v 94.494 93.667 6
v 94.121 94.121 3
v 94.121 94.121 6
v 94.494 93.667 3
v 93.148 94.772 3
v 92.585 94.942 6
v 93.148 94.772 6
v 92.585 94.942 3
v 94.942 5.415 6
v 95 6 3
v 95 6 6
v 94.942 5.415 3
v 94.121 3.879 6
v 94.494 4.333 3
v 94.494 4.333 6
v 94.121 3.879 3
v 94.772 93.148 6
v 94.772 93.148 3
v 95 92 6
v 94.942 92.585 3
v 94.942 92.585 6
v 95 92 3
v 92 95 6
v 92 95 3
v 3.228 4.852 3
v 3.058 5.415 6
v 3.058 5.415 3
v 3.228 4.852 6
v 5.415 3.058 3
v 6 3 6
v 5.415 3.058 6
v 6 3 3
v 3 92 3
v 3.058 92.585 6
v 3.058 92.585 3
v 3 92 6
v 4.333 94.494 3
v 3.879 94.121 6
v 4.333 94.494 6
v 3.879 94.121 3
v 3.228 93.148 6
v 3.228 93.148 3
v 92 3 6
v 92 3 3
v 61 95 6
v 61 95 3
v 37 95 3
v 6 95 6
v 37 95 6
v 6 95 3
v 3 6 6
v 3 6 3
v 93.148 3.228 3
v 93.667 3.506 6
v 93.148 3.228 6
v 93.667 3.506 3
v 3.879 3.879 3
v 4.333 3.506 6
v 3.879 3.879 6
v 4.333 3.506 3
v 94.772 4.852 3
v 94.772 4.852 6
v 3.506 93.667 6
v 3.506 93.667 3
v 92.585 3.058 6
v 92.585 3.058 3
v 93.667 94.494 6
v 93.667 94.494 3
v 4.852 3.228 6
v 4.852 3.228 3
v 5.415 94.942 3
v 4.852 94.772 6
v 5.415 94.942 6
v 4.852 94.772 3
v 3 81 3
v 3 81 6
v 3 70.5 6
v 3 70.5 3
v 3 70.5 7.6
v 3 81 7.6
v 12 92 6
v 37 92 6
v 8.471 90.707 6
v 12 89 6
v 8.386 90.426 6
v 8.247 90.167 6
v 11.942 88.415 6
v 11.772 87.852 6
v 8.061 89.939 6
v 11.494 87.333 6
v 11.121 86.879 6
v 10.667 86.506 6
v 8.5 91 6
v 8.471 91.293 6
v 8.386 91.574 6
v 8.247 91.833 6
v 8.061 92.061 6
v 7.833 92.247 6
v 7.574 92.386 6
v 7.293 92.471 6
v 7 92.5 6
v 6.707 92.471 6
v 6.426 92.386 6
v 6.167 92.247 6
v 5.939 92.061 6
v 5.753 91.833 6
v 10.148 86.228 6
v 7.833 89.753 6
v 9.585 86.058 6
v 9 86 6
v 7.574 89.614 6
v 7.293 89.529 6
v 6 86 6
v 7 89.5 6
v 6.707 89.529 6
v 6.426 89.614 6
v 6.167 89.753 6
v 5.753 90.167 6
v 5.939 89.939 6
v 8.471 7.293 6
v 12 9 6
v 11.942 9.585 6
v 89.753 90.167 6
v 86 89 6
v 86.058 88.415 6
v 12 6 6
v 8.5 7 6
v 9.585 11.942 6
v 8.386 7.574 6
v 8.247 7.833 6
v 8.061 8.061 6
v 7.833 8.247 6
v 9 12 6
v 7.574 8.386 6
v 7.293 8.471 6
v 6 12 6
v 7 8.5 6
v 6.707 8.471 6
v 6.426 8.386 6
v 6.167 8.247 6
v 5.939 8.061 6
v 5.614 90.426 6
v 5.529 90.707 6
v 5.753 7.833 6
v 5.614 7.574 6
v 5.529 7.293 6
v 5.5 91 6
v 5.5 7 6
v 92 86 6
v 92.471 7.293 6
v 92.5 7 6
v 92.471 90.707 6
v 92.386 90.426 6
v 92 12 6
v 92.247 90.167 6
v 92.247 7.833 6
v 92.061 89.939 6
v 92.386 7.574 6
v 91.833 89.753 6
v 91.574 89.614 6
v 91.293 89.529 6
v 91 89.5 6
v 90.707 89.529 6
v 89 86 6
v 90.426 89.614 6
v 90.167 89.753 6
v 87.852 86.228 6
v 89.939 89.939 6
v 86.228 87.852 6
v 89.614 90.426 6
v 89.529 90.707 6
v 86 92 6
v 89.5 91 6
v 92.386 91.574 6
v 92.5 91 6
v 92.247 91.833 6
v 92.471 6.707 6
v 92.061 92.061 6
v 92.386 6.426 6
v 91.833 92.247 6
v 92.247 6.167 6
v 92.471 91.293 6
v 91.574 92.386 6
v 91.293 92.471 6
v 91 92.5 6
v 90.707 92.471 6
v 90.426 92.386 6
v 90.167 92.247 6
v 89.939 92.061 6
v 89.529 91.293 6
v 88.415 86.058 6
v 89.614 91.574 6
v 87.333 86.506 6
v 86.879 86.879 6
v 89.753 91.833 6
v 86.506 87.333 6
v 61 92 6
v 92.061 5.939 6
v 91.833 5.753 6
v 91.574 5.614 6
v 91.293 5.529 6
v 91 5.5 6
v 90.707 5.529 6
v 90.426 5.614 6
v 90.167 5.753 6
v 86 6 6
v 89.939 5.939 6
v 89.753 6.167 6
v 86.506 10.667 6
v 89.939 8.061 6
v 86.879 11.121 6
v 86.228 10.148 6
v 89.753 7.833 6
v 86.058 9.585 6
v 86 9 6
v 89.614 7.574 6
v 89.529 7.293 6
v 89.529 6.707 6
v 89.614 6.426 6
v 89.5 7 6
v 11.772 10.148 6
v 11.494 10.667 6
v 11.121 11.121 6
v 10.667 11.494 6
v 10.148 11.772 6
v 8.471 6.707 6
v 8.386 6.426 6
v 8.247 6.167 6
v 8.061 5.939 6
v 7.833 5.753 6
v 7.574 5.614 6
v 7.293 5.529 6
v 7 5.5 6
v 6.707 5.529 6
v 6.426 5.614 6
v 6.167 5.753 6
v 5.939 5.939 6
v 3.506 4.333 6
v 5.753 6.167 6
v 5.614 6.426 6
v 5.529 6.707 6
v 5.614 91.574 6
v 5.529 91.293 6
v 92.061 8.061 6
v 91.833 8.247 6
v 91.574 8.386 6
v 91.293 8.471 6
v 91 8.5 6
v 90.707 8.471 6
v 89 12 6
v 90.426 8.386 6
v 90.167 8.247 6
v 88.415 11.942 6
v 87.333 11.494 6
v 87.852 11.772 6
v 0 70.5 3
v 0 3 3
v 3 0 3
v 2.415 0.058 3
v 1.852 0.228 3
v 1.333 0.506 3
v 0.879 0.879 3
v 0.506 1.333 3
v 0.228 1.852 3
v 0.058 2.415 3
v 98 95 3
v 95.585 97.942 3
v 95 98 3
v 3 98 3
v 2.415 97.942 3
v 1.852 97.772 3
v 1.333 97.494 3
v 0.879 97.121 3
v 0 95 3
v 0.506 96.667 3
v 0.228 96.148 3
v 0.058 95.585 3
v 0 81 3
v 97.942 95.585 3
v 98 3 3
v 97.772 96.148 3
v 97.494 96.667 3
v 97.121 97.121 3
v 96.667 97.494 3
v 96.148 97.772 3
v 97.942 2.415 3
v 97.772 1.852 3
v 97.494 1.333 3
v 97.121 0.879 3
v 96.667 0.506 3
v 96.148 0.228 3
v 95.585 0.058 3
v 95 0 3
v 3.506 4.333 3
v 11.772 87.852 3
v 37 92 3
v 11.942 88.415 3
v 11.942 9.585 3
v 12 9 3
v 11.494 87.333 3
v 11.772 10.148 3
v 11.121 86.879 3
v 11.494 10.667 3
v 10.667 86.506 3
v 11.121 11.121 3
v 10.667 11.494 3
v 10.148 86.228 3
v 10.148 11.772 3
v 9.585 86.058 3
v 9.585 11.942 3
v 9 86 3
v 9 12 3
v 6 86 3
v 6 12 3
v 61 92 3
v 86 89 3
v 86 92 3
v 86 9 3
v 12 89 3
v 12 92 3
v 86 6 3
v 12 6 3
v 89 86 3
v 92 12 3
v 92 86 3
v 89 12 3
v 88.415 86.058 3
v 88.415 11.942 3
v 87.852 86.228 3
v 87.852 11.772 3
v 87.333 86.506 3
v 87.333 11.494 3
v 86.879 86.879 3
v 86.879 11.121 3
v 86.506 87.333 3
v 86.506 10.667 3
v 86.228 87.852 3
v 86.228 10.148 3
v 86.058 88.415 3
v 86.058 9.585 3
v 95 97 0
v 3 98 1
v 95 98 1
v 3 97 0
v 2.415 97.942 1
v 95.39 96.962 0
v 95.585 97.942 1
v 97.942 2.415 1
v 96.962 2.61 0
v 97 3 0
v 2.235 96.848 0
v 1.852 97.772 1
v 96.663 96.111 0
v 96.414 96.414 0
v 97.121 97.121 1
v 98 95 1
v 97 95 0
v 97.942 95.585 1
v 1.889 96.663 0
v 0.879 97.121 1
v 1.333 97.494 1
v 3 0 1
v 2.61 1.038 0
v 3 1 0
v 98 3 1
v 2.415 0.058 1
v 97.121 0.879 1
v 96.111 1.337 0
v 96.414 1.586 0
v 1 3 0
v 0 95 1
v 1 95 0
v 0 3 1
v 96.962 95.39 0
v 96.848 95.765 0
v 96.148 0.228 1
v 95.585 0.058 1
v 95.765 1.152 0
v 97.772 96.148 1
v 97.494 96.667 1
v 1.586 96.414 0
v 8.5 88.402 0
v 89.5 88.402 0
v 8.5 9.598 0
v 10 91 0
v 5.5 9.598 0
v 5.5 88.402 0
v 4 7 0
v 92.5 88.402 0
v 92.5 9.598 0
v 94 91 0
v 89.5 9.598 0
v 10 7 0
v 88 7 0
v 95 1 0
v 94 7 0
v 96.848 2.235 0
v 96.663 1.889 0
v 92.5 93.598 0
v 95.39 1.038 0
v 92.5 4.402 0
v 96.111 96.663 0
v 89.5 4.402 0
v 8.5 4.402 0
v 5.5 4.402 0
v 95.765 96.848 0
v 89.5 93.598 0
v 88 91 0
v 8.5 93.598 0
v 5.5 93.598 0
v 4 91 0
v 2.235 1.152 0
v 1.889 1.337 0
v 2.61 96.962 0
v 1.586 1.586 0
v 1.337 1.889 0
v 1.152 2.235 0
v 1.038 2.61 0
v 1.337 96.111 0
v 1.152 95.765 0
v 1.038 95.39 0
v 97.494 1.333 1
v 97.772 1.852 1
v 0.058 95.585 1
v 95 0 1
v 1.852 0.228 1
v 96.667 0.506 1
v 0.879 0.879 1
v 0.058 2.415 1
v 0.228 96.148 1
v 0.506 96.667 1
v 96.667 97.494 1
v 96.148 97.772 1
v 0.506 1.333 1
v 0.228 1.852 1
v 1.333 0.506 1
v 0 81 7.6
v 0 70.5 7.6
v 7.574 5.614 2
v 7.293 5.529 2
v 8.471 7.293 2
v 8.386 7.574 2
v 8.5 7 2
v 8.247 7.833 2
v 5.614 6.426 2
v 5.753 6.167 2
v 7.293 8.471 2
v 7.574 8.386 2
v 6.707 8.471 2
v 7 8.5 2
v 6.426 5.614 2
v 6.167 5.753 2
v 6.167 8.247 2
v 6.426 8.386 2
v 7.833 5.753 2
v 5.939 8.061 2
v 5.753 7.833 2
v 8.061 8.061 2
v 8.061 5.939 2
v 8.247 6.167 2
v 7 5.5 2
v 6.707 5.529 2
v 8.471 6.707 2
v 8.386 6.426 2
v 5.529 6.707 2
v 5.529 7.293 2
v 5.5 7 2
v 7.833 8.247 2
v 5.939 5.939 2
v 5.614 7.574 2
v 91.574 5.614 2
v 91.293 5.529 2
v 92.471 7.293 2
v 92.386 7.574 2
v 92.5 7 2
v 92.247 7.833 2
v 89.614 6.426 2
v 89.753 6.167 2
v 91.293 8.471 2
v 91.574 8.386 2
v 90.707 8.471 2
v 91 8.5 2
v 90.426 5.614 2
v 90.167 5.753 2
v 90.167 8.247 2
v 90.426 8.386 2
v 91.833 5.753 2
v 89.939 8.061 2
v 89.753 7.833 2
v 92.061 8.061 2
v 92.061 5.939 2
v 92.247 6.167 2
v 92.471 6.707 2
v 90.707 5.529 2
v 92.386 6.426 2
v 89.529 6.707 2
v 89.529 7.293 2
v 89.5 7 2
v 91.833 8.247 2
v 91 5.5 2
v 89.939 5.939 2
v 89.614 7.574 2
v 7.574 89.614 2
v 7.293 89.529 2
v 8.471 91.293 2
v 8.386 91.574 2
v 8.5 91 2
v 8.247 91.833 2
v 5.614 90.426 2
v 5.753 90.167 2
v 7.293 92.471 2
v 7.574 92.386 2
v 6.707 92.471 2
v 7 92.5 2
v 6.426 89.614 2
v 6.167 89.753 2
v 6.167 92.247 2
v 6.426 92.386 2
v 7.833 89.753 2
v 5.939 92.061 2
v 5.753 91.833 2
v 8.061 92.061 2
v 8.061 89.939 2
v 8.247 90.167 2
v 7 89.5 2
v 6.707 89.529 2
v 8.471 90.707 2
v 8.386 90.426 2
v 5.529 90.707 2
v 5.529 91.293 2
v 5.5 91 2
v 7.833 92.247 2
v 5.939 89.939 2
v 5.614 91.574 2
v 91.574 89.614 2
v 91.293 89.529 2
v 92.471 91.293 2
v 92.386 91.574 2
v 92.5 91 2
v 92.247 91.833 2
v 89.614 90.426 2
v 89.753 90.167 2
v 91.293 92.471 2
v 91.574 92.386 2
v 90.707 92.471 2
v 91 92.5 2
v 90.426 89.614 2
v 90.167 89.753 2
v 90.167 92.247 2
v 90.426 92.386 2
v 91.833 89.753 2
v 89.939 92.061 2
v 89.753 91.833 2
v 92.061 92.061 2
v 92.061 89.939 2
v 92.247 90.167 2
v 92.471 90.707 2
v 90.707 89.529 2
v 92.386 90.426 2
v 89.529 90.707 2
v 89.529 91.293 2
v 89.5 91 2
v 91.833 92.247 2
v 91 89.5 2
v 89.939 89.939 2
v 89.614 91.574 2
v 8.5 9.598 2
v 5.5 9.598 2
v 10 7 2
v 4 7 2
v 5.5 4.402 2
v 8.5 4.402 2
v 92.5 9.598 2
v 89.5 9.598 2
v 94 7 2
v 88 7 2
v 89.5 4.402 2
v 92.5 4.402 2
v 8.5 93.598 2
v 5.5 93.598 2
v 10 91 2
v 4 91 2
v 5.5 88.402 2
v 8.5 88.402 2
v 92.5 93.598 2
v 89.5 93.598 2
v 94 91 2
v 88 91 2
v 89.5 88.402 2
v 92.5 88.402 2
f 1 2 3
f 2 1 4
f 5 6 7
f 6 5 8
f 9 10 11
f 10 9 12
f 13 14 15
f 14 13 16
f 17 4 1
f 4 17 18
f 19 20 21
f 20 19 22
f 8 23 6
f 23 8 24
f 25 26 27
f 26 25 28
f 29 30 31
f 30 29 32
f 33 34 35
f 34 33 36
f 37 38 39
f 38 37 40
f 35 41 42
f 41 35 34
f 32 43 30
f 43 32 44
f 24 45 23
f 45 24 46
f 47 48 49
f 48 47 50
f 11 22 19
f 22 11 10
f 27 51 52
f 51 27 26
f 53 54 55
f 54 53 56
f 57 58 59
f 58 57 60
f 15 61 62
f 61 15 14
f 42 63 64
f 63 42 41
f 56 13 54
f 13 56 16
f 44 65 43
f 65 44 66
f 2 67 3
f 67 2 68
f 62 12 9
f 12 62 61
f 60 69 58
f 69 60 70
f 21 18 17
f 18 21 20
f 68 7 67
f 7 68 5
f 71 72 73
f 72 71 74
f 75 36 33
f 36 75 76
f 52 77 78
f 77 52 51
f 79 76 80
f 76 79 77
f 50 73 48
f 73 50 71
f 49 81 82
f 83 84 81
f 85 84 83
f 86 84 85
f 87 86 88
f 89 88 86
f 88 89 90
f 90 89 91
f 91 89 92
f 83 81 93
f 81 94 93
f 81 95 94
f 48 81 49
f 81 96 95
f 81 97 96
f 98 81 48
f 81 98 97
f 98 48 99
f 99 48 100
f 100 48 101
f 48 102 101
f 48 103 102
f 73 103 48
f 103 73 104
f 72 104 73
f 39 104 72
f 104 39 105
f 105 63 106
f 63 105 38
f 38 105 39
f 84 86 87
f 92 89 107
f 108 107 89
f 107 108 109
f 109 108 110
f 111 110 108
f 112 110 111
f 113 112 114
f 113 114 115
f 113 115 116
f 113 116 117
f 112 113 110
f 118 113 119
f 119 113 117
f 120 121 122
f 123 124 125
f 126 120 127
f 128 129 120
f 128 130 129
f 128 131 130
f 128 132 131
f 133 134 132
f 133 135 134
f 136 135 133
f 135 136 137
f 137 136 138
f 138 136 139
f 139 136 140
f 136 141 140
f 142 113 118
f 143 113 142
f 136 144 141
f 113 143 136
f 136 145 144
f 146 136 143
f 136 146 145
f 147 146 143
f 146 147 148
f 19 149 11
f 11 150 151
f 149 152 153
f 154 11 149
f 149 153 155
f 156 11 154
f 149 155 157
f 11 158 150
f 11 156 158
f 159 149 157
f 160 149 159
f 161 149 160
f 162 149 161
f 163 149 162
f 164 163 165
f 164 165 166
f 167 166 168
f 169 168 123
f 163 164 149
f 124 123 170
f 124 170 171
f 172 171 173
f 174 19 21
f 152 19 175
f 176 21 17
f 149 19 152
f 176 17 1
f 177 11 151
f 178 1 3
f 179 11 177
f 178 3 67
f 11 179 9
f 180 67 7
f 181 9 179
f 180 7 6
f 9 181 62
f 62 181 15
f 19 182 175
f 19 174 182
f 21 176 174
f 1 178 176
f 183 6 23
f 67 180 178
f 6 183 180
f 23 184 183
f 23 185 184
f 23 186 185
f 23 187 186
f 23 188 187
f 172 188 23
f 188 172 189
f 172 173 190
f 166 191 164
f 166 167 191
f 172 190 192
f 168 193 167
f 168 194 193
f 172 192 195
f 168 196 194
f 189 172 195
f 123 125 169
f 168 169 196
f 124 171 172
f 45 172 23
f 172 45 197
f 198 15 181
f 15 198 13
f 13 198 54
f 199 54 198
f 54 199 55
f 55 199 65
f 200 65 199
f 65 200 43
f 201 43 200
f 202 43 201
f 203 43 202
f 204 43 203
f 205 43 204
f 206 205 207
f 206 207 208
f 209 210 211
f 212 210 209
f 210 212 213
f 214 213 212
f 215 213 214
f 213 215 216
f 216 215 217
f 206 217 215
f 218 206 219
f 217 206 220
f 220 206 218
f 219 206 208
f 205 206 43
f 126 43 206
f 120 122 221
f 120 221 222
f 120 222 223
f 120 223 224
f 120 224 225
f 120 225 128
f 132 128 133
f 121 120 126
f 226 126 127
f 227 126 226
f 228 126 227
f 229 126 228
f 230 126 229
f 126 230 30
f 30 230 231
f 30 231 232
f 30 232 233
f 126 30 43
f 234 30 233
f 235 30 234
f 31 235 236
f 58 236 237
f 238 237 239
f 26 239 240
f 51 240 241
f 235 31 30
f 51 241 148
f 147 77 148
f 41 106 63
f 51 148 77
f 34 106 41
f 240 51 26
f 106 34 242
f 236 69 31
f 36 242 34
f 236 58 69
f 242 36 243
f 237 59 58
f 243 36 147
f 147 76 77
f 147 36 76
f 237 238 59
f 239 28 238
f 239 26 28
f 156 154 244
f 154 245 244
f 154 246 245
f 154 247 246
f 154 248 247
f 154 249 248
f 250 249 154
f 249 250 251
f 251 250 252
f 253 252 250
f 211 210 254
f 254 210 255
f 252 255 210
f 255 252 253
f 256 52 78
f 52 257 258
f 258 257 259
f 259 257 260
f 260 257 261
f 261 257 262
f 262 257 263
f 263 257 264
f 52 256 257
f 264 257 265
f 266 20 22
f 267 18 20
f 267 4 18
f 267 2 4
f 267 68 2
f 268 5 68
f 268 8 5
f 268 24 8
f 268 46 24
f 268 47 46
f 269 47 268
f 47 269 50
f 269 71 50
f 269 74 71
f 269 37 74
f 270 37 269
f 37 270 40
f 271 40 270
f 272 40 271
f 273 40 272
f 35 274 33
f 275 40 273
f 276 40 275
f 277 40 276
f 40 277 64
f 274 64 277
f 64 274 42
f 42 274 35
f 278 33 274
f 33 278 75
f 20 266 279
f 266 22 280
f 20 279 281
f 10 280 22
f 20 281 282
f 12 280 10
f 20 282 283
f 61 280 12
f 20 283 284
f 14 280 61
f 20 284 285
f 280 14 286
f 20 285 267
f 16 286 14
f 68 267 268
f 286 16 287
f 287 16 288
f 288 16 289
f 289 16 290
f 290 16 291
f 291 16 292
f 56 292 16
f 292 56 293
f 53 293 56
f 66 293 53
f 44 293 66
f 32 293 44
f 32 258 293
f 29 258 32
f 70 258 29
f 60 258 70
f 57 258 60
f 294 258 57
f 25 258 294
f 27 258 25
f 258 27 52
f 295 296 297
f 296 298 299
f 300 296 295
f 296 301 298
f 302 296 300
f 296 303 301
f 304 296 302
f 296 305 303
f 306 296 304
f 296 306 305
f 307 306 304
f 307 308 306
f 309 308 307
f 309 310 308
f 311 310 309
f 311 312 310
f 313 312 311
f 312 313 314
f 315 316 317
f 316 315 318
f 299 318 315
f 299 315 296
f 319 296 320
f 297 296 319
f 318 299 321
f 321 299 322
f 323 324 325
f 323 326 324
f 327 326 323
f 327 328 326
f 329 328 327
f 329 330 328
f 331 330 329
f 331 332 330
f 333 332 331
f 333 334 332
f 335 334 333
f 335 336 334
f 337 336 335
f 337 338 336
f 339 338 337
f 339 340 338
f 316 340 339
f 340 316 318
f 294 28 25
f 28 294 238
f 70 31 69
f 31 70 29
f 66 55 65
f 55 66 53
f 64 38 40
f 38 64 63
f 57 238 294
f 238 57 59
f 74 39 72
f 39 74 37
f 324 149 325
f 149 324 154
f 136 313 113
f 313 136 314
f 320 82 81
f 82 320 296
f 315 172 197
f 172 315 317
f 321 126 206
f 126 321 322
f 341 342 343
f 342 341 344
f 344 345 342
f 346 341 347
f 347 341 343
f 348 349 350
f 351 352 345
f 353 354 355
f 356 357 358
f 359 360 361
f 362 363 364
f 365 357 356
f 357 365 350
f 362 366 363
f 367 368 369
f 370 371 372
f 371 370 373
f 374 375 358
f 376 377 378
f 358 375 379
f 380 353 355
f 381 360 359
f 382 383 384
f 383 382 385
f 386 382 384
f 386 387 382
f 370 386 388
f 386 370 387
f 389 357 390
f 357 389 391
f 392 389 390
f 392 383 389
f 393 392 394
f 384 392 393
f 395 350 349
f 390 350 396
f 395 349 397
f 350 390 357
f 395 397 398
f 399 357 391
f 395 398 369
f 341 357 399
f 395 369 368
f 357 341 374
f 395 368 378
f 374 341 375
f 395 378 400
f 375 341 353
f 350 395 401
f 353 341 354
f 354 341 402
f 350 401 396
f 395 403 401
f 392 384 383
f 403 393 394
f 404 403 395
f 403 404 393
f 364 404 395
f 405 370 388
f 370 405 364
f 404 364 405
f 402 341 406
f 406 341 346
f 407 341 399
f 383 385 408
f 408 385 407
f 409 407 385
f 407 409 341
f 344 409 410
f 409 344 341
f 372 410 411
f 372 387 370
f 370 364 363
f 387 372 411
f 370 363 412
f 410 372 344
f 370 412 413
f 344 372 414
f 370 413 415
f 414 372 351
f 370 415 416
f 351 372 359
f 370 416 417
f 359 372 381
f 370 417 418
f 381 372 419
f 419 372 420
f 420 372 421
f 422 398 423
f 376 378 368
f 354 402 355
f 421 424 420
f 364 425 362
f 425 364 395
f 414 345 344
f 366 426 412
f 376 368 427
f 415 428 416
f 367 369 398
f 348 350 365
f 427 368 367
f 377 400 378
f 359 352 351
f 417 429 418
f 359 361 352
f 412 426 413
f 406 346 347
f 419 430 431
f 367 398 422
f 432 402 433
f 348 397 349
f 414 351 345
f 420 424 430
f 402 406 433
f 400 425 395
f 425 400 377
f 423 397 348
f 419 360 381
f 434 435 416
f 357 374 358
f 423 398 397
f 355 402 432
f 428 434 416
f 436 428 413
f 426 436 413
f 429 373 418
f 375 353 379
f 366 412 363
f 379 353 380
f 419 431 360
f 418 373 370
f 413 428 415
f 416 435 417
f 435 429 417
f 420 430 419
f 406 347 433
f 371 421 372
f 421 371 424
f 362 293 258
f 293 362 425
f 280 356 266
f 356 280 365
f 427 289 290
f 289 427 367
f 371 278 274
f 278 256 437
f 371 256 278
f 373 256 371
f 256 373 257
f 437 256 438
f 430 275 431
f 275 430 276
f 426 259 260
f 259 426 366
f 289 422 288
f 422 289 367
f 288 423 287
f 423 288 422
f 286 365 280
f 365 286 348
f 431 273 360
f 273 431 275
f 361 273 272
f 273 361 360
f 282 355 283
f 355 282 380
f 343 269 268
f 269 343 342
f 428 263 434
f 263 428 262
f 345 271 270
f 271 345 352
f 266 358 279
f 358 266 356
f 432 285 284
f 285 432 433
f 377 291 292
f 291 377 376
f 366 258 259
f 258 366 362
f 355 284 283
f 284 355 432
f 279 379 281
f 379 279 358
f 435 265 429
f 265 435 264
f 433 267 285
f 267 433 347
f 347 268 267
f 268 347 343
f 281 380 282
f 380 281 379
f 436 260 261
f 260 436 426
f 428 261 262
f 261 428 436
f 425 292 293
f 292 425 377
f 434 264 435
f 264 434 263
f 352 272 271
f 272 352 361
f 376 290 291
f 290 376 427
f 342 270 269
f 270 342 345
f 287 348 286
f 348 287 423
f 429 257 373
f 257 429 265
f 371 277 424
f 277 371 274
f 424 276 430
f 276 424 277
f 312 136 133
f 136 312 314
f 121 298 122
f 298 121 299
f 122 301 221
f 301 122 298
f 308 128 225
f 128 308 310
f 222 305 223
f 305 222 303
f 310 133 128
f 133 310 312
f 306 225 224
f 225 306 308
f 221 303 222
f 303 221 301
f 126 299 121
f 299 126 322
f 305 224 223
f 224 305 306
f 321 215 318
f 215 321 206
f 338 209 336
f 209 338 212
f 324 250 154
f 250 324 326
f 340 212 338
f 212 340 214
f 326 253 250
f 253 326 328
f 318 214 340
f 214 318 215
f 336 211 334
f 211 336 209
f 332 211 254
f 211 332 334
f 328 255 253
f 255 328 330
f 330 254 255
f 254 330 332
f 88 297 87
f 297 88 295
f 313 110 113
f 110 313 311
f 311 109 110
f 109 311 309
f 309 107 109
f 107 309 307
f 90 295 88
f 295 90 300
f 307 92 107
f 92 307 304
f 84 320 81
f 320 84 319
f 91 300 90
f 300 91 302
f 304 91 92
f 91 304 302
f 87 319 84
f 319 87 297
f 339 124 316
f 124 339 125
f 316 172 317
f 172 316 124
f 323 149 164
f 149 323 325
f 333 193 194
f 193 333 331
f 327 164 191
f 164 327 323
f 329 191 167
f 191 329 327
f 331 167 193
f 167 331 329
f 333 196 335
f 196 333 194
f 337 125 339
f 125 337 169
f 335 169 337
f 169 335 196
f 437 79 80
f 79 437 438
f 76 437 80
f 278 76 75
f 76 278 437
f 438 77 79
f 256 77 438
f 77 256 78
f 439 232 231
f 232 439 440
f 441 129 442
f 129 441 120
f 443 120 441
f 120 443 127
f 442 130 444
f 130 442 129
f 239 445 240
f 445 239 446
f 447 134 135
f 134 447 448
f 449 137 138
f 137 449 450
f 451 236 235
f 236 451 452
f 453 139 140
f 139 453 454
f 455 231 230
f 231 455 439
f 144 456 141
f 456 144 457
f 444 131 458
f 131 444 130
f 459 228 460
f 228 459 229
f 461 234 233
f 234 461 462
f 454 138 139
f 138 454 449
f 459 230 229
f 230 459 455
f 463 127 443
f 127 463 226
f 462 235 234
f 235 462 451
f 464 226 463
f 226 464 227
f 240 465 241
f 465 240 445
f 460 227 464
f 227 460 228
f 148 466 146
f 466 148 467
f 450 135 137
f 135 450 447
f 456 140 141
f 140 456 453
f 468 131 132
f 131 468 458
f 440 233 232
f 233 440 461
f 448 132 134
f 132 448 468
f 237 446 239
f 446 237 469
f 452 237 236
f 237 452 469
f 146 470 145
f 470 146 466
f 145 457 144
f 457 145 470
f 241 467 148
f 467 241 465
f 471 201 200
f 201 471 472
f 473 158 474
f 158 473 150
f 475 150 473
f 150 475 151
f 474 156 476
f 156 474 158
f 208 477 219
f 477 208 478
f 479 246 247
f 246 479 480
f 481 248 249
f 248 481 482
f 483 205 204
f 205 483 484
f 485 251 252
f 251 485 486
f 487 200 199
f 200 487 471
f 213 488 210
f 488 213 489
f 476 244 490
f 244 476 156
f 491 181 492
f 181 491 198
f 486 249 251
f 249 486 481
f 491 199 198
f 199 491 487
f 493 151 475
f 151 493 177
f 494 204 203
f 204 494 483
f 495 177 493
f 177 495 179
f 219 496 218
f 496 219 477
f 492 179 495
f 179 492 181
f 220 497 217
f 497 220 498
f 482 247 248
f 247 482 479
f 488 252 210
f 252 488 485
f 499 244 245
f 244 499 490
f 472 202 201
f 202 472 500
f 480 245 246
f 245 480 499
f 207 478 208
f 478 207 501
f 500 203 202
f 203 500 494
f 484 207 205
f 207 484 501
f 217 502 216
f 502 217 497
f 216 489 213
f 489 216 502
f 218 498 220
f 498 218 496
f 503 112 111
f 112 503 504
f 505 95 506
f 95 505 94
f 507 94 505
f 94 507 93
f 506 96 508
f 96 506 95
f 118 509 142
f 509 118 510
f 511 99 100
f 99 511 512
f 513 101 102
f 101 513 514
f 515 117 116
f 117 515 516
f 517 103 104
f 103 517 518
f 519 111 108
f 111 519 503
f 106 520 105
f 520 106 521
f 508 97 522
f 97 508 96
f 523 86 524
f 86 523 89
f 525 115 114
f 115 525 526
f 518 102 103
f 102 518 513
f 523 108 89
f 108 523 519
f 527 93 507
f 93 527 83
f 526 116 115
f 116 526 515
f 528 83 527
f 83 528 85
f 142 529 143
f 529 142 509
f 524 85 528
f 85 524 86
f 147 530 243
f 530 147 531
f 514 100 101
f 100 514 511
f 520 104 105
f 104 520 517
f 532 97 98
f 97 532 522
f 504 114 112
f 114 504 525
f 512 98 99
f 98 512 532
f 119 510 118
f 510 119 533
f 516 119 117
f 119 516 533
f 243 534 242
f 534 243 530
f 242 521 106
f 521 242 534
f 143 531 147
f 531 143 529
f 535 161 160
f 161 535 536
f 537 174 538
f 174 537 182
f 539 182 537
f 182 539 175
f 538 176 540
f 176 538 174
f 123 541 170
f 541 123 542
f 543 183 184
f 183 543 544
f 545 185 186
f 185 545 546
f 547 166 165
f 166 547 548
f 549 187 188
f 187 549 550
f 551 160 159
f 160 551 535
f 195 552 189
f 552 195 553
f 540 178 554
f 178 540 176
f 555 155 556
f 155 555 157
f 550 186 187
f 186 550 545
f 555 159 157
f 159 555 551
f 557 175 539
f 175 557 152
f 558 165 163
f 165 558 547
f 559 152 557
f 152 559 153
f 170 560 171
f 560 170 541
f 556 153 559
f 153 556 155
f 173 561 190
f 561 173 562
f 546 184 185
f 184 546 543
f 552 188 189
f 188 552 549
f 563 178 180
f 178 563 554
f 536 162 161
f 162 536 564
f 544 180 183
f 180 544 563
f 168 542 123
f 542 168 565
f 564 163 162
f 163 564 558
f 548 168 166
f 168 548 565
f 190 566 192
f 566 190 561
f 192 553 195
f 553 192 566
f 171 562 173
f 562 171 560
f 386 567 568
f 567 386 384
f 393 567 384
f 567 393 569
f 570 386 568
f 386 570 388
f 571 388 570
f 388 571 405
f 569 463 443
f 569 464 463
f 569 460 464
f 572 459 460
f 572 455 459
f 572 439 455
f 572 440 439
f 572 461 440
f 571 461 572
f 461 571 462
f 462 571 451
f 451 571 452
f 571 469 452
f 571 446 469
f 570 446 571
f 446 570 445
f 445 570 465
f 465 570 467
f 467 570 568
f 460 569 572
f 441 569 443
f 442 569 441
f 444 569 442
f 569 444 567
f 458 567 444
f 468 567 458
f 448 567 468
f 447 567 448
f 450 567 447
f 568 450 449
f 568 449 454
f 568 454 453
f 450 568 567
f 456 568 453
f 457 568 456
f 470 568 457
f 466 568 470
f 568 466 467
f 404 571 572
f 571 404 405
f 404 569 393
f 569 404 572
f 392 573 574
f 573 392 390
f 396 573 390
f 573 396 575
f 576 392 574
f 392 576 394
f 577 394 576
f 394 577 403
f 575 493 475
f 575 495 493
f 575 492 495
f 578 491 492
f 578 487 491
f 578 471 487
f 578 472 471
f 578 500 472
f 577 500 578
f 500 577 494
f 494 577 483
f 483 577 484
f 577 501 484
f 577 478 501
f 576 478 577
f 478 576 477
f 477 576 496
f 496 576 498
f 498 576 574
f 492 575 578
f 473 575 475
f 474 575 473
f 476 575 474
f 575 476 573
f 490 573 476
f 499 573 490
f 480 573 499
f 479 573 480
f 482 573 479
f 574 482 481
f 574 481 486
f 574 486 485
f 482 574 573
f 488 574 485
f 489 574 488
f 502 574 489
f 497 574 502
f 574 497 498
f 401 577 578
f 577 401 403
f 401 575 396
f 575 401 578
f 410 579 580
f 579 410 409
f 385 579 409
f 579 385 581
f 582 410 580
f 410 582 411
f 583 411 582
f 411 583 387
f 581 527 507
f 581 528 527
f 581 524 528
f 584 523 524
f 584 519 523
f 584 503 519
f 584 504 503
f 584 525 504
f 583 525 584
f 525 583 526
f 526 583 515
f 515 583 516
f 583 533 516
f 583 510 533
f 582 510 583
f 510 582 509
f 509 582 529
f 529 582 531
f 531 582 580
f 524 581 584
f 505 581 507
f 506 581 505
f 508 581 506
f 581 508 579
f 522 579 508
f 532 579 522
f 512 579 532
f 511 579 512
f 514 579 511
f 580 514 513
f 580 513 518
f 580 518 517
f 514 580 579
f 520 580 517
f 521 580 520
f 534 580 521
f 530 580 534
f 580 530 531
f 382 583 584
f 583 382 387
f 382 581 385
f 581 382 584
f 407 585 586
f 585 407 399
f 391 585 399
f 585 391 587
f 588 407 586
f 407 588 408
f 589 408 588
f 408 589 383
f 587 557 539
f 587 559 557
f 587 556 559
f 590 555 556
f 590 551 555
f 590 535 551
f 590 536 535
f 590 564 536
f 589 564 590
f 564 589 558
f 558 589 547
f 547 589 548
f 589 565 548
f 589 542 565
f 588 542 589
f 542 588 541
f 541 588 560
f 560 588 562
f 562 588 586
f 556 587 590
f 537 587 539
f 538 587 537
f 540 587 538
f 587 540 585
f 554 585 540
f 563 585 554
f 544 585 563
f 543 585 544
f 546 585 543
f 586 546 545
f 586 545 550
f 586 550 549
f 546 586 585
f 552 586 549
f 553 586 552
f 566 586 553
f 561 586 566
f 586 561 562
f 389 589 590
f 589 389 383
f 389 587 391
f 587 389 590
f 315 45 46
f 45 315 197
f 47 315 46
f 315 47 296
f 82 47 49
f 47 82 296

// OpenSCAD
$fn=32;

// https://www.youtube.com/watch?v=gKOkJWiTgAY
module roundedsquare(xdim, ydim, zdim, rdim){
    hull() {
        translate([       rdim,        rdim, 0]) cylinder(h=zdim, r=rdim);
        translate([xdim - rdim,        rdim, 0]) cylinder(h=zdim, r=rdim);
        translate([       rdim, ydim - rdim, 0]) cylinder(h=zdim, r=rdim);
        translate([xdim - rdim, ydim - rdim, 0]) cylinder(h=zdim, r=rdim);
    }
}
module chamferedsquare(xdim, ydim, zdim, r1dim, r2dim){
    bigrdim = max(r1dim, r2dim);
    hull() {
        translate([       bigrdim,        bigrdim, 0]) cylinder(h=zdim, r1=r1dim, r2=r2dim);
        translate([xdim - bigrdim,        bigrdim, 0]) cylinder(h=zdim, r1=r1dim, r2=r2dim);
        translate([       bigrdim, ydim - bigrdim, 0]) cylinder(h=zdim, r1=r1dim, r2=r2dim);
        translate([xdim - bigrdim, ydim - bigrdim, 0]) cylinder(h=zdim, r1=r1dim, r2=r2dim);
    }
}

cS = 98; // case size
cR = 3;  // case radius (rounded corners)

clH = 3; // case lip height
clC = 1; // case lip chamfer
clS = 3; // case lip size

cpR = 3; // case pcb radius
cpH = 3; // case pcb height
cpW = 3; // case pcb wall
cpM = 9; // case pcb mounting pole size

module case_bottom() {
    difference() {
        union() {
            // Case floor
            chamferedsquare(cS, cS, clC, cR - clC, cR);
            translate([0, 0, clC]) roundedsquare(cS, cS, clH - clC, cR);

            // PCB table
            difference() {
                translate([      clS,       clS, clH]) roundedsquare(cS - clS * 2, cS - clS * 2, cpH, cpR);
                translate([clS + cpW, clS + cpW, clH]) cube([cS - clS * 2 - cpW * 2, cS - clS * 2 - cpW * 2, cpH]);
            }
            translate([                   clS,                    clS, clH]) roundedsquare(cpM, cpM, cpH, cpR);
            translate([cS - clS * 2 - cpW * 2,                    clS, clH]) roundedsquare(cpM, cpM, cpH, cpR);
            translate([                   clS, cS - clS * 2 - cpW * 2, clH]) roundedsquare(cpM, cpM, cpH, cpR);
            translate([cS - clS * 2 - cpW * 2, cS - clS * 2 - cpW * 2, clH]) roundedsquare(cpM, cpM, cpH, cpR);

            // USB-C pillar
            translate([0, 70.5, clH]) cube([clS, 10.5, cpW+1.6]);
        }

        union() {
            // Bolt holes
            translate([     7,      7, 6]) cylinder(d=3, h=14, center=true);
            translate([cS - 7,      7, 6]) cylinder(d=3, h=14, center=true);
            translate([     7, cS - 7, 6]) cylinder(d=3, h=14, center=true);
            translate([cS - 7, cS - 7, 6]) cylinder(d=3, h=14, center=true);

            // Nut holes
            translate([     7,      7, 1]) cylinder($fn=6, r=3, h=2, center=true);
            translate([cS - 7,      7, 1]) cylinder($fn=6, r=3, h=2, center=true);
            translate([     7, cS - 7, 1]) cylinder($fn=6, r=3, h=2, center=true);
            translate([cS - 7, cS - 7, 1]) cylinder($fn=6, r=3, h=2, center=true);

            // Hole for screen cable
            translate([cS/2, cS-clS-cpW/2, clH+cpH/2]) cube([24, cpW, cpH], center=true);
        }
    }
}

ctH = 7; // case top height
ctW = 3; // case top wall

module case_top() {
    translate([0, 0, ctH]) chamferedsquare(cS, cS, 1, 3, 2);
    difference() {
        roundedsquare(cS, cS, ctH, cR);
        translate([ctW, ctW, 0]) roundedsquare(cS - ctW * 2, cS - ctW * 2, ctH, cR);
    }
}

// case_top();
case_bottom();
